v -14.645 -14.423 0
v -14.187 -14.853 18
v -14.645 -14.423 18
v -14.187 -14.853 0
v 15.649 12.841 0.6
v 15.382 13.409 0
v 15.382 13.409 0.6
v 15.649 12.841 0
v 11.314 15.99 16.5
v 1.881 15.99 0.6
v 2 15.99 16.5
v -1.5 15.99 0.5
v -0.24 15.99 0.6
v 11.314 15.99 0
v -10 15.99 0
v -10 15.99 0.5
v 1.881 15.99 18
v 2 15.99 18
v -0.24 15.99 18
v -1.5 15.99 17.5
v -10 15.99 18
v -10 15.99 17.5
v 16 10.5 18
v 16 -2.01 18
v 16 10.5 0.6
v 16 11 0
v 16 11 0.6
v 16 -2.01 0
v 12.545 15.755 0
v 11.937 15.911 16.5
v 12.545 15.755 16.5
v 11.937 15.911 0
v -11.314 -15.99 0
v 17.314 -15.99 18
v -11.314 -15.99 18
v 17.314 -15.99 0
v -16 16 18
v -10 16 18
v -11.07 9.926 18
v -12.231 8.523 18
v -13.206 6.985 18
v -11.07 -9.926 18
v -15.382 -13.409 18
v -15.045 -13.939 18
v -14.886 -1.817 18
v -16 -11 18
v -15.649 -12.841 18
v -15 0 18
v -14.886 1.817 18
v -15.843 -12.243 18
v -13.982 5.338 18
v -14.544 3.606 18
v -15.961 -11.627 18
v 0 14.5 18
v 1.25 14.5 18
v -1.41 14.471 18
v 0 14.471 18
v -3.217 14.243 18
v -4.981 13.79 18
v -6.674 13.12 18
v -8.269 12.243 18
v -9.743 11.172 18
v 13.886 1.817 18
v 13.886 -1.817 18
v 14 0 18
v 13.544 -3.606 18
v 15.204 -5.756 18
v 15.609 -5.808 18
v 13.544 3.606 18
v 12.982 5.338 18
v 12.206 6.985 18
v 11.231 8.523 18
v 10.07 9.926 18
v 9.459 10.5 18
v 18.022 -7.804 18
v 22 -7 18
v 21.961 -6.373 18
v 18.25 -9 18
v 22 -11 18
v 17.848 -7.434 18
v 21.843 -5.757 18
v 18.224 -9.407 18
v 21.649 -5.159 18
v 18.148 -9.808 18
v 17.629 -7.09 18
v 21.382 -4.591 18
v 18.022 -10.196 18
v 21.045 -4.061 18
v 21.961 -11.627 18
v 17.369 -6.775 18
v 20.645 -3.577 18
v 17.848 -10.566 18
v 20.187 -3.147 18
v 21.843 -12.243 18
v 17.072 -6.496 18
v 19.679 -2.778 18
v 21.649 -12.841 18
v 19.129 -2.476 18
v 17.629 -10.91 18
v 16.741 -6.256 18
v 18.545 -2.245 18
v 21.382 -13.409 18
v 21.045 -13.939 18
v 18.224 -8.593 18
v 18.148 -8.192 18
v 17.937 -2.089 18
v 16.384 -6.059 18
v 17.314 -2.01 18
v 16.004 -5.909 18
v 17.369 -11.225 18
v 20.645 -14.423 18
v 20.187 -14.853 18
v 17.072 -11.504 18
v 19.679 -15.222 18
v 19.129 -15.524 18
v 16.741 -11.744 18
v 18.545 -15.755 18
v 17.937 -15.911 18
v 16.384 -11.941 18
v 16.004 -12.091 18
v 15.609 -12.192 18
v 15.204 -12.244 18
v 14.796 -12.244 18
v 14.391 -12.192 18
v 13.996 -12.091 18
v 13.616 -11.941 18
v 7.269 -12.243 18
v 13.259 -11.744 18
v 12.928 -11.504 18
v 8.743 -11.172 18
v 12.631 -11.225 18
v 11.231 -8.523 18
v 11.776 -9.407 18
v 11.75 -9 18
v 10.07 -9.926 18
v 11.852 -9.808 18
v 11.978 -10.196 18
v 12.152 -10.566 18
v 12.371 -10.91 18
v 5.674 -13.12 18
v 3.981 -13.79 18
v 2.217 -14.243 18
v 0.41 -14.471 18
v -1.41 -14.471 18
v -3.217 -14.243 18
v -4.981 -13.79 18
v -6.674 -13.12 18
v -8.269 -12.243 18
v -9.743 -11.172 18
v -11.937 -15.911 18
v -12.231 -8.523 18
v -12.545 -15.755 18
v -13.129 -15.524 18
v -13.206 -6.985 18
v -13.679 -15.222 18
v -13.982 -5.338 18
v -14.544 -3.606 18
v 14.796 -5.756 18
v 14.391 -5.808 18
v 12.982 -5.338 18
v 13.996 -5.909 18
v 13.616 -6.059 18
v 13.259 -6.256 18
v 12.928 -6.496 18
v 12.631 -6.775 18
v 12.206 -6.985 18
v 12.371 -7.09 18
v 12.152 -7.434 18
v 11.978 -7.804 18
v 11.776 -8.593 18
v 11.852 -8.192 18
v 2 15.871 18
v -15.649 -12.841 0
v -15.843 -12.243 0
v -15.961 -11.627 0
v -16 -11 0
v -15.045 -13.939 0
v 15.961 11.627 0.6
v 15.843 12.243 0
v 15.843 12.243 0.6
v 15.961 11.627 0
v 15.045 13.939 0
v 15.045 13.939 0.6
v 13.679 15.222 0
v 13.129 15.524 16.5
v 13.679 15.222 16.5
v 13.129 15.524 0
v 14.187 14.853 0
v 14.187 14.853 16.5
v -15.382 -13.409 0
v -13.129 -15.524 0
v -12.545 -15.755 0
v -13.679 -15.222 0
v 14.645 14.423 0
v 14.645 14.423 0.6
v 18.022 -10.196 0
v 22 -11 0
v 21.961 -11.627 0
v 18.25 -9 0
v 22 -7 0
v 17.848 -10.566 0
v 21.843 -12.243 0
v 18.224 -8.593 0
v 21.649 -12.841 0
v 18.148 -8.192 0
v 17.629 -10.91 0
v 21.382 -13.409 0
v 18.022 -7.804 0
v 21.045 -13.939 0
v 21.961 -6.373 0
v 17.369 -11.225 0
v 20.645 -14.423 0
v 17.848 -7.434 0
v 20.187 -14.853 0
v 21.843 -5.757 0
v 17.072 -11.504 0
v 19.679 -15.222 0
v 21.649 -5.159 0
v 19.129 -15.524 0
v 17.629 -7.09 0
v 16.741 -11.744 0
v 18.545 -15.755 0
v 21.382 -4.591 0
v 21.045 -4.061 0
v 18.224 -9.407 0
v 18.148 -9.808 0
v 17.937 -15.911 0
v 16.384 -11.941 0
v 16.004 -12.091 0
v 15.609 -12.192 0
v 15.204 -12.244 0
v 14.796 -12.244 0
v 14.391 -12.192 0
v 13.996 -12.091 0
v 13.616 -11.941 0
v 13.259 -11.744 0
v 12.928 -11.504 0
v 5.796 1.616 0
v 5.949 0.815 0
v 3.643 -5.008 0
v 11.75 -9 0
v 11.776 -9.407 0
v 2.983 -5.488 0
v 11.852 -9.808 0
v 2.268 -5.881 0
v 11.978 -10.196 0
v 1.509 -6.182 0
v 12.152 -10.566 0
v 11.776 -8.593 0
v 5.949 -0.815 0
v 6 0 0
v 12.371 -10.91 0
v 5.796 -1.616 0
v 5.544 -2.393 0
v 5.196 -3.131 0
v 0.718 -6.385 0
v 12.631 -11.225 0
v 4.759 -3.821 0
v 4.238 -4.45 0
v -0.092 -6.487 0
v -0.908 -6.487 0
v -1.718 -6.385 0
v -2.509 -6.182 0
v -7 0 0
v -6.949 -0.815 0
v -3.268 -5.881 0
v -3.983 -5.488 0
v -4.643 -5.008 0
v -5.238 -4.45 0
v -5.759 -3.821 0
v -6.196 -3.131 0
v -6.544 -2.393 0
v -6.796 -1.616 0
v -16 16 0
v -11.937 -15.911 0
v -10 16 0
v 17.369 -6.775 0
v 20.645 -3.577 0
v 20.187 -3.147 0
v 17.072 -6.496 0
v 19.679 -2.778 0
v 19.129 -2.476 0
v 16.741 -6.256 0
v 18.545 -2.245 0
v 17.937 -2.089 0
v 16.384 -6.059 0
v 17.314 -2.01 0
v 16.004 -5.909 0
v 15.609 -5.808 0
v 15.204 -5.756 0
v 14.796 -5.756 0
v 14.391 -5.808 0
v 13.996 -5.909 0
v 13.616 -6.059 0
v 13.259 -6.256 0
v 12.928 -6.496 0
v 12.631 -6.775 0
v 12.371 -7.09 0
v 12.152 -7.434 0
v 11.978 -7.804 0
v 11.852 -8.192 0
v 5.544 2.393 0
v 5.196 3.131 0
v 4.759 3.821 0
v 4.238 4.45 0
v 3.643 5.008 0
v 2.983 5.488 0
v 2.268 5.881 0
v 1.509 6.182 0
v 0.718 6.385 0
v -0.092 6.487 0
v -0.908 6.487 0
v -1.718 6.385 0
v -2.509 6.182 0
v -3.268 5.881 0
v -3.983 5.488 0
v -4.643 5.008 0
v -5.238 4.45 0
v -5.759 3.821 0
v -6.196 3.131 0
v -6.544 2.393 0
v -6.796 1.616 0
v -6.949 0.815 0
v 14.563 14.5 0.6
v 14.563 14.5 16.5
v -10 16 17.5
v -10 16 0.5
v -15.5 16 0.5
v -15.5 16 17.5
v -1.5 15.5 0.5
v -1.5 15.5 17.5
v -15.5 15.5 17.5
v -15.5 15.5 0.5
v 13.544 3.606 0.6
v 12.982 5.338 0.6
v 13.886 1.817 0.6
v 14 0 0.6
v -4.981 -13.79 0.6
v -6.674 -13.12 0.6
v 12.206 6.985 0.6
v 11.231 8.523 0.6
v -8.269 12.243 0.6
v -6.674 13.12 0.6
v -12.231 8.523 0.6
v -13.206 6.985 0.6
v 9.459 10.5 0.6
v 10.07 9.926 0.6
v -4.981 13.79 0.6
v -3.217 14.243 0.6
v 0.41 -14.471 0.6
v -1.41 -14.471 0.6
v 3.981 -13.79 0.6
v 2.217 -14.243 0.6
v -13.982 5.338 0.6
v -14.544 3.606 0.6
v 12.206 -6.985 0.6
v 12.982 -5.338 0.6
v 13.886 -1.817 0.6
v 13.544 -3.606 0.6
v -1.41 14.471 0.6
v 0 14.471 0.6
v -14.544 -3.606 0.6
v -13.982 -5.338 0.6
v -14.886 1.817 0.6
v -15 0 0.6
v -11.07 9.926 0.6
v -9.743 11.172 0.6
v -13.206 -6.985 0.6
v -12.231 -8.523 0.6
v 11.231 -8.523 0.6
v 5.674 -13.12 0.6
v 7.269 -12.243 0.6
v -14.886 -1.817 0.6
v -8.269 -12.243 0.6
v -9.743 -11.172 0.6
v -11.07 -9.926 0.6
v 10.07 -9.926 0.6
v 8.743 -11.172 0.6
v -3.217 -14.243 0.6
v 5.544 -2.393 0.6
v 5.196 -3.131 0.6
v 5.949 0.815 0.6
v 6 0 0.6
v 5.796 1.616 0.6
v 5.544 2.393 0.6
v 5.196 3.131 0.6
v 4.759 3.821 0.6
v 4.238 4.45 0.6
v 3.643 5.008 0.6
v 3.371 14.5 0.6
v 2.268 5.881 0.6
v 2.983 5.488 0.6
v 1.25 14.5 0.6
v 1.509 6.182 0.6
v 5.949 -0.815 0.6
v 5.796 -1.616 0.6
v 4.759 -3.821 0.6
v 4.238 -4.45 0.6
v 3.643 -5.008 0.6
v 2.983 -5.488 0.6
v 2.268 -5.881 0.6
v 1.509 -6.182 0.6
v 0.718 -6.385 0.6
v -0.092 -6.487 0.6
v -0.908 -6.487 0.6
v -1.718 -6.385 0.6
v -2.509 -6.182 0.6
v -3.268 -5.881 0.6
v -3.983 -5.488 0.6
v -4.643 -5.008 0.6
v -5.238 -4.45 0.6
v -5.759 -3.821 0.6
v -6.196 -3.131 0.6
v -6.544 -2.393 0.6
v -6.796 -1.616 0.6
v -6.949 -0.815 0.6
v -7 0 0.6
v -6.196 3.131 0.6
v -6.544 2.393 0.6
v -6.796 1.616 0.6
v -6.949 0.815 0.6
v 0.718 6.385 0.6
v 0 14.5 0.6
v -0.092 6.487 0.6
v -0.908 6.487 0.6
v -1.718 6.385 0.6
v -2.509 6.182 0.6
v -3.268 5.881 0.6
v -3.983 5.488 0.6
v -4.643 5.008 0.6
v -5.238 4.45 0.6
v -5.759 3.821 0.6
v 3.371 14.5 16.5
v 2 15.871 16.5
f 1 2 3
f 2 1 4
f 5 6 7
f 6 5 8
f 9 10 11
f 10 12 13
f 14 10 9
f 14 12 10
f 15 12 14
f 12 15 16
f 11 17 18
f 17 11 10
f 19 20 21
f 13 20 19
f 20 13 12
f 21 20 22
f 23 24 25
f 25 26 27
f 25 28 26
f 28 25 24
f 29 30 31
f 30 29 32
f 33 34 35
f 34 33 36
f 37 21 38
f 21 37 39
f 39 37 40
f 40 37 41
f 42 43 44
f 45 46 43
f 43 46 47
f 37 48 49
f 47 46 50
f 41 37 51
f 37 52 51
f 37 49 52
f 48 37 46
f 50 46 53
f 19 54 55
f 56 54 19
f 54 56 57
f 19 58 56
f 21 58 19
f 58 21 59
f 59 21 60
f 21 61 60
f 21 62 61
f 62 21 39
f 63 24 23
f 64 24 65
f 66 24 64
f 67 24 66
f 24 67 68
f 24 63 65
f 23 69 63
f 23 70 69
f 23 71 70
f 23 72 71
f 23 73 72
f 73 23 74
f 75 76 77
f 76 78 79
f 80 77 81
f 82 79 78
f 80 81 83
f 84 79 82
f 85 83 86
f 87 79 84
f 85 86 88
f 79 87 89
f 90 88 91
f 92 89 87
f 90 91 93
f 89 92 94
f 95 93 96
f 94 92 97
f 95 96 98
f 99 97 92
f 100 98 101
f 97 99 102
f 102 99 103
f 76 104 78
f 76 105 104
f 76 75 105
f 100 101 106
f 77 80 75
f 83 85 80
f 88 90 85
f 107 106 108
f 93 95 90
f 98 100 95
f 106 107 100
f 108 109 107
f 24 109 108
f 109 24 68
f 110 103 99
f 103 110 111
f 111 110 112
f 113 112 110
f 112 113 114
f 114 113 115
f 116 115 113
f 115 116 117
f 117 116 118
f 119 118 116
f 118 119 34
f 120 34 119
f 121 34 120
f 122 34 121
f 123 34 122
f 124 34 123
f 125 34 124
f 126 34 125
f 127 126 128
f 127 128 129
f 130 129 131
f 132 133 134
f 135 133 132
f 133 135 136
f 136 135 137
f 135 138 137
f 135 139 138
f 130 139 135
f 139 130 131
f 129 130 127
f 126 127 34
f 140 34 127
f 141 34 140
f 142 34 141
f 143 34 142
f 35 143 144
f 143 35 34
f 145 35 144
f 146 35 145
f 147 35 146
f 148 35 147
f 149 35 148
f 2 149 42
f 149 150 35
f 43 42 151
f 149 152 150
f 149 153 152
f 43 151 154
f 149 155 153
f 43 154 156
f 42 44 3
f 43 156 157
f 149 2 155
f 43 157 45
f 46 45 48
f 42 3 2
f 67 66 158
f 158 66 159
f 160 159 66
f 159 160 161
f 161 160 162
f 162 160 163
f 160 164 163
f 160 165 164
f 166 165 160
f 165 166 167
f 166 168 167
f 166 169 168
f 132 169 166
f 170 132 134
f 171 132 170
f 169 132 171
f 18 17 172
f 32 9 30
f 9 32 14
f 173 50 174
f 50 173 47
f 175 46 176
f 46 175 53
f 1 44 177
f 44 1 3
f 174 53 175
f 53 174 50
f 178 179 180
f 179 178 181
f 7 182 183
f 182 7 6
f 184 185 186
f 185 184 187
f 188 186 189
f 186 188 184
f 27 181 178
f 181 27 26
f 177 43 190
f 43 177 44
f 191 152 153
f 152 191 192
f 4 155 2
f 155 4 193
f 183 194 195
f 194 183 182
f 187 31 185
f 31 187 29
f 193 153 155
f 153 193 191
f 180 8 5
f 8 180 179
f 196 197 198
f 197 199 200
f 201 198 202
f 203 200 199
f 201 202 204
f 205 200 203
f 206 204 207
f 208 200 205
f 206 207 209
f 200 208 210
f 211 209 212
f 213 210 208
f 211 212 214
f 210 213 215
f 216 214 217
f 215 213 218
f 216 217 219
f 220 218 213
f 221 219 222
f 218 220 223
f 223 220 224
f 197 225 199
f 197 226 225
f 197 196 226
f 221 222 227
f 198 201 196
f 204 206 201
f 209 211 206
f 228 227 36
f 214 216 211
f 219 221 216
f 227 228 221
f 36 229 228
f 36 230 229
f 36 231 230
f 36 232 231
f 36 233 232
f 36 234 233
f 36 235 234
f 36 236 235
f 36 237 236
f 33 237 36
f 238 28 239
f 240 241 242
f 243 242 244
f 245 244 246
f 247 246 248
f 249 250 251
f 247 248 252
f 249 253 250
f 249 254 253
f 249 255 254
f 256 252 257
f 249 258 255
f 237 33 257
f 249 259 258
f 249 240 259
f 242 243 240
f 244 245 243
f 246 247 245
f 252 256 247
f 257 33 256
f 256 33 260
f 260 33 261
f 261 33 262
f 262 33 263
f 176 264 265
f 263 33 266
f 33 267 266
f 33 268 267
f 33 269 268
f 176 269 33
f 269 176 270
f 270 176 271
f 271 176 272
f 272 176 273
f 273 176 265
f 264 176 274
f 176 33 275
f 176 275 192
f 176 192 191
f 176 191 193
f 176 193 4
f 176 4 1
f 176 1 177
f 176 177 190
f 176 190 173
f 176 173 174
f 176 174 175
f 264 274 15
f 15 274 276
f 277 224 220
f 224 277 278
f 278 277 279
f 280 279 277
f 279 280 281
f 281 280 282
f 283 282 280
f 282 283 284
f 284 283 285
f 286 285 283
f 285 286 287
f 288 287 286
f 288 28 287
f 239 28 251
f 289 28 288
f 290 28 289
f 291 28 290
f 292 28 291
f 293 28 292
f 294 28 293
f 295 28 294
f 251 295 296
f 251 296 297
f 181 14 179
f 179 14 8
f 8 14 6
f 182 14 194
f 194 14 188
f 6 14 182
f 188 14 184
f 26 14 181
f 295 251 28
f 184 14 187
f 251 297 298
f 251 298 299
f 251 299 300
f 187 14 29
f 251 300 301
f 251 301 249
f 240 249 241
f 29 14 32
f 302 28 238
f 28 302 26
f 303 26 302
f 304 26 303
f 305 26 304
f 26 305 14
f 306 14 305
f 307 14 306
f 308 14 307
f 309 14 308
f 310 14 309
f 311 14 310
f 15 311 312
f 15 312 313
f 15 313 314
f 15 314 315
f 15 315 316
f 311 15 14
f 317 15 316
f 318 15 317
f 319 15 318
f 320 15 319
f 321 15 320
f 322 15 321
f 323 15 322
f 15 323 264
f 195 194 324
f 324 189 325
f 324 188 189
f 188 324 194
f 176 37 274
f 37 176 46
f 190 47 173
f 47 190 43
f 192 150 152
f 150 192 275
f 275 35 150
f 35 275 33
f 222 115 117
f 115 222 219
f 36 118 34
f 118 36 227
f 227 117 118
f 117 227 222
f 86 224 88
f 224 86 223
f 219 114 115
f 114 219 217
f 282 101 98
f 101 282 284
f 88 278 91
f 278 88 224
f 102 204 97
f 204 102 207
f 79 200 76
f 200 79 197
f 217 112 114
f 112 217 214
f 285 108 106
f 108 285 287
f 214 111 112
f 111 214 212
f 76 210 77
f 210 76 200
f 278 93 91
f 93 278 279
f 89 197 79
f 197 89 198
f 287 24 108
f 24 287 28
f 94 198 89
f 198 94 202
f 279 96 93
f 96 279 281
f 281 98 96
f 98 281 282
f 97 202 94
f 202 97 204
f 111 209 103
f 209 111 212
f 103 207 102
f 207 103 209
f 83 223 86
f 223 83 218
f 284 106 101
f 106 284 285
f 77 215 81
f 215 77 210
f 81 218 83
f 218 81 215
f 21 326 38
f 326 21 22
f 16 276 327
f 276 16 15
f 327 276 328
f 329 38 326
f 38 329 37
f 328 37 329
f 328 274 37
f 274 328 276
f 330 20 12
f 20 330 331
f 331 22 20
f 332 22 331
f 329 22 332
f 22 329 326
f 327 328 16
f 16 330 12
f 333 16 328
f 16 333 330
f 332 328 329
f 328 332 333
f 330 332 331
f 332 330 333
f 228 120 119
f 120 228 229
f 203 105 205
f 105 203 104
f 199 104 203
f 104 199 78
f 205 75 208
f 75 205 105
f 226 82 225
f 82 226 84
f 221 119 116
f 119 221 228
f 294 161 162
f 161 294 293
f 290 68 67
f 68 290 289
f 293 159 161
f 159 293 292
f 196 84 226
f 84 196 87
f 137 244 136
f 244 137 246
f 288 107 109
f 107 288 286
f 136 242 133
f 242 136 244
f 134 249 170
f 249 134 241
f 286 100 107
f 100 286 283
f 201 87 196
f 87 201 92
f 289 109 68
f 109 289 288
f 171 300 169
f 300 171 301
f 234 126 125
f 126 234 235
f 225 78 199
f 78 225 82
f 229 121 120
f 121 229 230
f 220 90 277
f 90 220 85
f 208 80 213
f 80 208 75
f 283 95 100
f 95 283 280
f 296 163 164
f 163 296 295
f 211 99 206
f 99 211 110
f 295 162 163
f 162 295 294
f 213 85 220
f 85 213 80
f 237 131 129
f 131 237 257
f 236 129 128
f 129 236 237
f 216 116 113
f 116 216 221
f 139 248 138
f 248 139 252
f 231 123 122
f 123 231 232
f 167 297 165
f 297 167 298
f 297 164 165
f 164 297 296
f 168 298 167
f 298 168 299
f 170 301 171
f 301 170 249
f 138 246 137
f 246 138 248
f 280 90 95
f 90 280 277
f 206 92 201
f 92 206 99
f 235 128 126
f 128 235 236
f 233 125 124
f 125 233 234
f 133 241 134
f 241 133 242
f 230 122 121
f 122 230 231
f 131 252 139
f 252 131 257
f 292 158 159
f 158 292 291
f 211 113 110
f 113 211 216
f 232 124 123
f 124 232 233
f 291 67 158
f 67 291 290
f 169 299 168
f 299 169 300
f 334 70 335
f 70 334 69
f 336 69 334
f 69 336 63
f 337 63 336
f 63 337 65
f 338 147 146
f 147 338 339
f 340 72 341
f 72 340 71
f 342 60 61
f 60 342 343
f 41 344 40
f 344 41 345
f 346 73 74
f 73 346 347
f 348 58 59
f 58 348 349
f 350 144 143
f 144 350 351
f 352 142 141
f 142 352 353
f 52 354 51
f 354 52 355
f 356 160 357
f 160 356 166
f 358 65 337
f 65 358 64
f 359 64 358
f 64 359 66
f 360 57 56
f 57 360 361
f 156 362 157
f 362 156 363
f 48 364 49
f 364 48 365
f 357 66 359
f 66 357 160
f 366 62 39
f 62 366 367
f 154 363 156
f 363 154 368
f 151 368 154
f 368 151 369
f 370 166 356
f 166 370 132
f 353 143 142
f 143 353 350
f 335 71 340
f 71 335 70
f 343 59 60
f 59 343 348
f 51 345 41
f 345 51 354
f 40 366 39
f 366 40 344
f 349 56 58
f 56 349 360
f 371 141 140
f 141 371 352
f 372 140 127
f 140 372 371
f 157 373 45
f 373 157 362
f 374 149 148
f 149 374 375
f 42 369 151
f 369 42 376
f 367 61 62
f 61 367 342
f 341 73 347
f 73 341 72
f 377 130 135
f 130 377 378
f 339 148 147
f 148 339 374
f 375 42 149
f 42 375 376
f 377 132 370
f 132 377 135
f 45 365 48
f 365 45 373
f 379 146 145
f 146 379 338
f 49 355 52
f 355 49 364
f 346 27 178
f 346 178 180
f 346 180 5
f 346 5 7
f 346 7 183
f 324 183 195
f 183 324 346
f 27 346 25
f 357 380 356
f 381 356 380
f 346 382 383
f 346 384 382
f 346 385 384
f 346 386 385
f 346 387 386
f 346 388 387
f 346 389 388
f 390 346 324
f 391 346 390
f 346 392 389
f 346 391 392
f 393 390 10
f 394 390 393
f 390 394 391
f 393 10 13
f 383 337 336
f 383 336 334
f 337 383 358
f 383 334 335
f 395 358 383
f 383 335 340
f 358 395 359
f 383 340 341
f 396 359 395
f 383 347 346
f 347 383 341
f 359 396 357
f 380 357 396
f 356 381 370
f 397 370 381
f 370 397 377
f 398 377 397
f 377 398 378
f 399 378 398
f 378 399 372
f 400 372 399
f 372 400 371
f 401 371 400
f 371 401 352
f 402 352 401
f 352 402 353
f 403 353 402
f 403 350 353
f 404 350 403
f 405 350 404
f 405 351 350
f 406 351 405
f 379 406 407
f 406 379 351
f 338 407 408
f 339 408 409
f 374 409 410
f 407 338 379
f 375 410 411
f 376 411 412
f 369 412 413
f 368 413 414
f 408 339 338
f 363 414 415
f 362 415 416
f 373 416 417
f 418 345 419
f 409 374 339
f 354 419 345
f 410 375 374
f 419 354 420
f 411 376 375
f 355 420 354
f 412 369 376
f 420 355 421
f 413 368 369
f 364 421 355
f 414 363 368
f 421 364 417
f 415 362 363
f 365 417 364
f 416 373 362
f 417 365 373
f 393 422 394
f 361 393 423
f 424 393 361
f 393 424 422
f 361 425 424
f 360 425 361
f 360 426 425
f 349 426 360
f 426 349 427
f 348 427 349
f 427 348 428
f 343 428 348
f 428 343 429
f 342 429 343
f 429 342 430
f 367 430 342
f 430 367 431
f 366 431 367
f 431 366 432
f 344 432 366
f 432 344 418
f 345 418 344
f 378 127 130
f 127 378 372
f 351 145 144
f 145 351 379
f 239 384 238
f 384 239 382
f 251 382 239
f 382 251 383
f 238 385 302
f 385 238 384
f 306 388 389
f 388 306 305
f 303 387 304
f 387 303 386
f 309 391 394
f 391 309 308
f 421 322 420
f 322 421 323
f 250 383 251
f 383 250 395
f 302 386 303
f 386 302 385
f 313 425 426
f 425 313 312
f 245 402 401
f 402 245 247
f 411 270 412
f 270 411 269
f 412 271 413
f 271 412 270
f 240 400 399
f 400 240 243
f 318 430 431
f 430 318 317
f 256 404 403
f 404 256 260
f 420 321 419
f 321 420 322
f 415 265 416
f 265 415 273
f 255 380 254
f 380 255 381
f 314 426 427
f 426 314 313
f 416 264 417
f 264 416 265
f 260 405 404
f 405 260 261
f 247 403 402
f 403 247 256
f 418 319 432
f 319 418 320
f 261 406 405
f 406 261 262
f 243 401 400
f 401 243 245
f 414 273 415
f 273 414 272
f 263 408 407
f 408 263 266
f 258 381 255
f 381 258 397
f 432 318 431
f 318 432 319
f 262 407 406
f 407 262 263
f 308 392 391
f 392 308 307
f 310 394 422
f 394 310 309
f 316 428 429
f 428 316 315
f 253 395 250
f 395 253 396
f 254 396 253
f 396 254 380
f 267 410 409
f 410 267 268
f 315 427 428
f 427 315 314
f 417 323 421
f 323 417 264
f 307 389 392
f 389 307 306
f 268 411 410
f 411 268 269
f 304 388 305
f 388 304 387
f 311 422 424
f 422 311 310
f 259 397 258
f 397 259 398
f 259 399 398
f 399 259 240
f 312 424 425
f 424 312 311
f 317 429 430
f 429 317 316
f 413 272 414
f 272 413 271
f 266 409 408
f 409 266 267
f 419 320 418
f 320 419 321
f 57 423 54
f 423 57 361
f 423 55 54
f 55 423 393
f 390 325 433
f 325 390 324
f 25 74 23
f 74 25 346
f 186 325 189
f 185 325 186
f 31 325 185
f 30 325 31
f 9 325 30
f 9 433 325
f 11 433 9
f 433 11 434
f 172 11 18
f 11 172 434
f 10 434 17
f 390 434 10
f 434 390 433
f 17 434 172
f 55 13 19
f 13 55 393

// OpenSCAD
$fn = 50;


difference() {
	union() {
		hull() {
			translate(v = [-11.0000000000, 11.0000000000, 0]) {
				cylinder(h = 18, r = 5);
			}
			translate(v = [11.0000000000, 11.0000000000, 0]) {
				cylinder(h = 18, r = 5);
			}
			translate(v = [-11.0000000000, -11.0000000000, 0]) {
				cylinder(h = 18, r = 5);
			}
			translate(v = [11.0000000000, -11.0000000000, 0]) {
				cylinder(h = 18, r = 5);
			}
		}
		translate(v = [7.5000000000, -9.0000000000, 0]) {
			hull() {
				translate(v = [-9.5000000000, 2.0000000000, 0]) {
					cylinder(h = 18, r = 5);
				}
				translate(v = [9.5000000000, 2.0000000000, 0]) {
					cylinder(h = 18, r = 5);
				}
				translate(v = [-9.5000000000, -2.0000000000, 0]) {
					cylinder(h = 18, r = 5);
				}
				translate(v = [9.5000000000, -2.0000000000, 0]) {
					cylinder(h = 18, r = 5);
				}
			}
		}
		translate(v = [-16.0000000000, 10.0000000000, 0]) {
			cube(size = [6, 6, 18]);
		}
	}
	union() {
		translate(v = [-15.5000000000, 15.5000000000, 0.5000000000]) {
			cube(size = [14, 0.5000000000, 17.0000000000]);
		}
		translate(v = [15.0000000000, -9.0000000000, -50.0000000000]) {
			cylinder(h = 100, r = 3.2500000000);
		}
		translate(v = [-0.5000000000, 0.0000000000, 0.6000000000]) {
			cylinder(h = 20.4000000000, r = 14.5000000000);
		}
		translate(v = [-0.5000000000, 0.0000000000, -9.0000000000]) {
			cylinder(h = 18, r = 6.5000000000);
		}
		translate(v = [0.0000000000, 10.5000000000, 0.6000000000]) {
			cube(size = [16.0000000000, 4, 20.4000000000]);
		}
		translate(v = [2.0000000000, 10.5000000000, 16.5000000000]) {
			cube(size = [14.0000000000, 7, 1.5000000000]);
		}
		translate(v = [-3.0000000000, 18.7500000000, 0.6000000000]) {
			rotate(a = [0, 0, -45]) {
				cube(size = [10, 1.5000000000, 20.4000000000]);
			}
		}
		translate(v = [2.2500000000, 11.0000000000, 0.6000000000]) {
			cube(size = [7.5000000000, 2, 17.4000000000]);
		}
	}
}
